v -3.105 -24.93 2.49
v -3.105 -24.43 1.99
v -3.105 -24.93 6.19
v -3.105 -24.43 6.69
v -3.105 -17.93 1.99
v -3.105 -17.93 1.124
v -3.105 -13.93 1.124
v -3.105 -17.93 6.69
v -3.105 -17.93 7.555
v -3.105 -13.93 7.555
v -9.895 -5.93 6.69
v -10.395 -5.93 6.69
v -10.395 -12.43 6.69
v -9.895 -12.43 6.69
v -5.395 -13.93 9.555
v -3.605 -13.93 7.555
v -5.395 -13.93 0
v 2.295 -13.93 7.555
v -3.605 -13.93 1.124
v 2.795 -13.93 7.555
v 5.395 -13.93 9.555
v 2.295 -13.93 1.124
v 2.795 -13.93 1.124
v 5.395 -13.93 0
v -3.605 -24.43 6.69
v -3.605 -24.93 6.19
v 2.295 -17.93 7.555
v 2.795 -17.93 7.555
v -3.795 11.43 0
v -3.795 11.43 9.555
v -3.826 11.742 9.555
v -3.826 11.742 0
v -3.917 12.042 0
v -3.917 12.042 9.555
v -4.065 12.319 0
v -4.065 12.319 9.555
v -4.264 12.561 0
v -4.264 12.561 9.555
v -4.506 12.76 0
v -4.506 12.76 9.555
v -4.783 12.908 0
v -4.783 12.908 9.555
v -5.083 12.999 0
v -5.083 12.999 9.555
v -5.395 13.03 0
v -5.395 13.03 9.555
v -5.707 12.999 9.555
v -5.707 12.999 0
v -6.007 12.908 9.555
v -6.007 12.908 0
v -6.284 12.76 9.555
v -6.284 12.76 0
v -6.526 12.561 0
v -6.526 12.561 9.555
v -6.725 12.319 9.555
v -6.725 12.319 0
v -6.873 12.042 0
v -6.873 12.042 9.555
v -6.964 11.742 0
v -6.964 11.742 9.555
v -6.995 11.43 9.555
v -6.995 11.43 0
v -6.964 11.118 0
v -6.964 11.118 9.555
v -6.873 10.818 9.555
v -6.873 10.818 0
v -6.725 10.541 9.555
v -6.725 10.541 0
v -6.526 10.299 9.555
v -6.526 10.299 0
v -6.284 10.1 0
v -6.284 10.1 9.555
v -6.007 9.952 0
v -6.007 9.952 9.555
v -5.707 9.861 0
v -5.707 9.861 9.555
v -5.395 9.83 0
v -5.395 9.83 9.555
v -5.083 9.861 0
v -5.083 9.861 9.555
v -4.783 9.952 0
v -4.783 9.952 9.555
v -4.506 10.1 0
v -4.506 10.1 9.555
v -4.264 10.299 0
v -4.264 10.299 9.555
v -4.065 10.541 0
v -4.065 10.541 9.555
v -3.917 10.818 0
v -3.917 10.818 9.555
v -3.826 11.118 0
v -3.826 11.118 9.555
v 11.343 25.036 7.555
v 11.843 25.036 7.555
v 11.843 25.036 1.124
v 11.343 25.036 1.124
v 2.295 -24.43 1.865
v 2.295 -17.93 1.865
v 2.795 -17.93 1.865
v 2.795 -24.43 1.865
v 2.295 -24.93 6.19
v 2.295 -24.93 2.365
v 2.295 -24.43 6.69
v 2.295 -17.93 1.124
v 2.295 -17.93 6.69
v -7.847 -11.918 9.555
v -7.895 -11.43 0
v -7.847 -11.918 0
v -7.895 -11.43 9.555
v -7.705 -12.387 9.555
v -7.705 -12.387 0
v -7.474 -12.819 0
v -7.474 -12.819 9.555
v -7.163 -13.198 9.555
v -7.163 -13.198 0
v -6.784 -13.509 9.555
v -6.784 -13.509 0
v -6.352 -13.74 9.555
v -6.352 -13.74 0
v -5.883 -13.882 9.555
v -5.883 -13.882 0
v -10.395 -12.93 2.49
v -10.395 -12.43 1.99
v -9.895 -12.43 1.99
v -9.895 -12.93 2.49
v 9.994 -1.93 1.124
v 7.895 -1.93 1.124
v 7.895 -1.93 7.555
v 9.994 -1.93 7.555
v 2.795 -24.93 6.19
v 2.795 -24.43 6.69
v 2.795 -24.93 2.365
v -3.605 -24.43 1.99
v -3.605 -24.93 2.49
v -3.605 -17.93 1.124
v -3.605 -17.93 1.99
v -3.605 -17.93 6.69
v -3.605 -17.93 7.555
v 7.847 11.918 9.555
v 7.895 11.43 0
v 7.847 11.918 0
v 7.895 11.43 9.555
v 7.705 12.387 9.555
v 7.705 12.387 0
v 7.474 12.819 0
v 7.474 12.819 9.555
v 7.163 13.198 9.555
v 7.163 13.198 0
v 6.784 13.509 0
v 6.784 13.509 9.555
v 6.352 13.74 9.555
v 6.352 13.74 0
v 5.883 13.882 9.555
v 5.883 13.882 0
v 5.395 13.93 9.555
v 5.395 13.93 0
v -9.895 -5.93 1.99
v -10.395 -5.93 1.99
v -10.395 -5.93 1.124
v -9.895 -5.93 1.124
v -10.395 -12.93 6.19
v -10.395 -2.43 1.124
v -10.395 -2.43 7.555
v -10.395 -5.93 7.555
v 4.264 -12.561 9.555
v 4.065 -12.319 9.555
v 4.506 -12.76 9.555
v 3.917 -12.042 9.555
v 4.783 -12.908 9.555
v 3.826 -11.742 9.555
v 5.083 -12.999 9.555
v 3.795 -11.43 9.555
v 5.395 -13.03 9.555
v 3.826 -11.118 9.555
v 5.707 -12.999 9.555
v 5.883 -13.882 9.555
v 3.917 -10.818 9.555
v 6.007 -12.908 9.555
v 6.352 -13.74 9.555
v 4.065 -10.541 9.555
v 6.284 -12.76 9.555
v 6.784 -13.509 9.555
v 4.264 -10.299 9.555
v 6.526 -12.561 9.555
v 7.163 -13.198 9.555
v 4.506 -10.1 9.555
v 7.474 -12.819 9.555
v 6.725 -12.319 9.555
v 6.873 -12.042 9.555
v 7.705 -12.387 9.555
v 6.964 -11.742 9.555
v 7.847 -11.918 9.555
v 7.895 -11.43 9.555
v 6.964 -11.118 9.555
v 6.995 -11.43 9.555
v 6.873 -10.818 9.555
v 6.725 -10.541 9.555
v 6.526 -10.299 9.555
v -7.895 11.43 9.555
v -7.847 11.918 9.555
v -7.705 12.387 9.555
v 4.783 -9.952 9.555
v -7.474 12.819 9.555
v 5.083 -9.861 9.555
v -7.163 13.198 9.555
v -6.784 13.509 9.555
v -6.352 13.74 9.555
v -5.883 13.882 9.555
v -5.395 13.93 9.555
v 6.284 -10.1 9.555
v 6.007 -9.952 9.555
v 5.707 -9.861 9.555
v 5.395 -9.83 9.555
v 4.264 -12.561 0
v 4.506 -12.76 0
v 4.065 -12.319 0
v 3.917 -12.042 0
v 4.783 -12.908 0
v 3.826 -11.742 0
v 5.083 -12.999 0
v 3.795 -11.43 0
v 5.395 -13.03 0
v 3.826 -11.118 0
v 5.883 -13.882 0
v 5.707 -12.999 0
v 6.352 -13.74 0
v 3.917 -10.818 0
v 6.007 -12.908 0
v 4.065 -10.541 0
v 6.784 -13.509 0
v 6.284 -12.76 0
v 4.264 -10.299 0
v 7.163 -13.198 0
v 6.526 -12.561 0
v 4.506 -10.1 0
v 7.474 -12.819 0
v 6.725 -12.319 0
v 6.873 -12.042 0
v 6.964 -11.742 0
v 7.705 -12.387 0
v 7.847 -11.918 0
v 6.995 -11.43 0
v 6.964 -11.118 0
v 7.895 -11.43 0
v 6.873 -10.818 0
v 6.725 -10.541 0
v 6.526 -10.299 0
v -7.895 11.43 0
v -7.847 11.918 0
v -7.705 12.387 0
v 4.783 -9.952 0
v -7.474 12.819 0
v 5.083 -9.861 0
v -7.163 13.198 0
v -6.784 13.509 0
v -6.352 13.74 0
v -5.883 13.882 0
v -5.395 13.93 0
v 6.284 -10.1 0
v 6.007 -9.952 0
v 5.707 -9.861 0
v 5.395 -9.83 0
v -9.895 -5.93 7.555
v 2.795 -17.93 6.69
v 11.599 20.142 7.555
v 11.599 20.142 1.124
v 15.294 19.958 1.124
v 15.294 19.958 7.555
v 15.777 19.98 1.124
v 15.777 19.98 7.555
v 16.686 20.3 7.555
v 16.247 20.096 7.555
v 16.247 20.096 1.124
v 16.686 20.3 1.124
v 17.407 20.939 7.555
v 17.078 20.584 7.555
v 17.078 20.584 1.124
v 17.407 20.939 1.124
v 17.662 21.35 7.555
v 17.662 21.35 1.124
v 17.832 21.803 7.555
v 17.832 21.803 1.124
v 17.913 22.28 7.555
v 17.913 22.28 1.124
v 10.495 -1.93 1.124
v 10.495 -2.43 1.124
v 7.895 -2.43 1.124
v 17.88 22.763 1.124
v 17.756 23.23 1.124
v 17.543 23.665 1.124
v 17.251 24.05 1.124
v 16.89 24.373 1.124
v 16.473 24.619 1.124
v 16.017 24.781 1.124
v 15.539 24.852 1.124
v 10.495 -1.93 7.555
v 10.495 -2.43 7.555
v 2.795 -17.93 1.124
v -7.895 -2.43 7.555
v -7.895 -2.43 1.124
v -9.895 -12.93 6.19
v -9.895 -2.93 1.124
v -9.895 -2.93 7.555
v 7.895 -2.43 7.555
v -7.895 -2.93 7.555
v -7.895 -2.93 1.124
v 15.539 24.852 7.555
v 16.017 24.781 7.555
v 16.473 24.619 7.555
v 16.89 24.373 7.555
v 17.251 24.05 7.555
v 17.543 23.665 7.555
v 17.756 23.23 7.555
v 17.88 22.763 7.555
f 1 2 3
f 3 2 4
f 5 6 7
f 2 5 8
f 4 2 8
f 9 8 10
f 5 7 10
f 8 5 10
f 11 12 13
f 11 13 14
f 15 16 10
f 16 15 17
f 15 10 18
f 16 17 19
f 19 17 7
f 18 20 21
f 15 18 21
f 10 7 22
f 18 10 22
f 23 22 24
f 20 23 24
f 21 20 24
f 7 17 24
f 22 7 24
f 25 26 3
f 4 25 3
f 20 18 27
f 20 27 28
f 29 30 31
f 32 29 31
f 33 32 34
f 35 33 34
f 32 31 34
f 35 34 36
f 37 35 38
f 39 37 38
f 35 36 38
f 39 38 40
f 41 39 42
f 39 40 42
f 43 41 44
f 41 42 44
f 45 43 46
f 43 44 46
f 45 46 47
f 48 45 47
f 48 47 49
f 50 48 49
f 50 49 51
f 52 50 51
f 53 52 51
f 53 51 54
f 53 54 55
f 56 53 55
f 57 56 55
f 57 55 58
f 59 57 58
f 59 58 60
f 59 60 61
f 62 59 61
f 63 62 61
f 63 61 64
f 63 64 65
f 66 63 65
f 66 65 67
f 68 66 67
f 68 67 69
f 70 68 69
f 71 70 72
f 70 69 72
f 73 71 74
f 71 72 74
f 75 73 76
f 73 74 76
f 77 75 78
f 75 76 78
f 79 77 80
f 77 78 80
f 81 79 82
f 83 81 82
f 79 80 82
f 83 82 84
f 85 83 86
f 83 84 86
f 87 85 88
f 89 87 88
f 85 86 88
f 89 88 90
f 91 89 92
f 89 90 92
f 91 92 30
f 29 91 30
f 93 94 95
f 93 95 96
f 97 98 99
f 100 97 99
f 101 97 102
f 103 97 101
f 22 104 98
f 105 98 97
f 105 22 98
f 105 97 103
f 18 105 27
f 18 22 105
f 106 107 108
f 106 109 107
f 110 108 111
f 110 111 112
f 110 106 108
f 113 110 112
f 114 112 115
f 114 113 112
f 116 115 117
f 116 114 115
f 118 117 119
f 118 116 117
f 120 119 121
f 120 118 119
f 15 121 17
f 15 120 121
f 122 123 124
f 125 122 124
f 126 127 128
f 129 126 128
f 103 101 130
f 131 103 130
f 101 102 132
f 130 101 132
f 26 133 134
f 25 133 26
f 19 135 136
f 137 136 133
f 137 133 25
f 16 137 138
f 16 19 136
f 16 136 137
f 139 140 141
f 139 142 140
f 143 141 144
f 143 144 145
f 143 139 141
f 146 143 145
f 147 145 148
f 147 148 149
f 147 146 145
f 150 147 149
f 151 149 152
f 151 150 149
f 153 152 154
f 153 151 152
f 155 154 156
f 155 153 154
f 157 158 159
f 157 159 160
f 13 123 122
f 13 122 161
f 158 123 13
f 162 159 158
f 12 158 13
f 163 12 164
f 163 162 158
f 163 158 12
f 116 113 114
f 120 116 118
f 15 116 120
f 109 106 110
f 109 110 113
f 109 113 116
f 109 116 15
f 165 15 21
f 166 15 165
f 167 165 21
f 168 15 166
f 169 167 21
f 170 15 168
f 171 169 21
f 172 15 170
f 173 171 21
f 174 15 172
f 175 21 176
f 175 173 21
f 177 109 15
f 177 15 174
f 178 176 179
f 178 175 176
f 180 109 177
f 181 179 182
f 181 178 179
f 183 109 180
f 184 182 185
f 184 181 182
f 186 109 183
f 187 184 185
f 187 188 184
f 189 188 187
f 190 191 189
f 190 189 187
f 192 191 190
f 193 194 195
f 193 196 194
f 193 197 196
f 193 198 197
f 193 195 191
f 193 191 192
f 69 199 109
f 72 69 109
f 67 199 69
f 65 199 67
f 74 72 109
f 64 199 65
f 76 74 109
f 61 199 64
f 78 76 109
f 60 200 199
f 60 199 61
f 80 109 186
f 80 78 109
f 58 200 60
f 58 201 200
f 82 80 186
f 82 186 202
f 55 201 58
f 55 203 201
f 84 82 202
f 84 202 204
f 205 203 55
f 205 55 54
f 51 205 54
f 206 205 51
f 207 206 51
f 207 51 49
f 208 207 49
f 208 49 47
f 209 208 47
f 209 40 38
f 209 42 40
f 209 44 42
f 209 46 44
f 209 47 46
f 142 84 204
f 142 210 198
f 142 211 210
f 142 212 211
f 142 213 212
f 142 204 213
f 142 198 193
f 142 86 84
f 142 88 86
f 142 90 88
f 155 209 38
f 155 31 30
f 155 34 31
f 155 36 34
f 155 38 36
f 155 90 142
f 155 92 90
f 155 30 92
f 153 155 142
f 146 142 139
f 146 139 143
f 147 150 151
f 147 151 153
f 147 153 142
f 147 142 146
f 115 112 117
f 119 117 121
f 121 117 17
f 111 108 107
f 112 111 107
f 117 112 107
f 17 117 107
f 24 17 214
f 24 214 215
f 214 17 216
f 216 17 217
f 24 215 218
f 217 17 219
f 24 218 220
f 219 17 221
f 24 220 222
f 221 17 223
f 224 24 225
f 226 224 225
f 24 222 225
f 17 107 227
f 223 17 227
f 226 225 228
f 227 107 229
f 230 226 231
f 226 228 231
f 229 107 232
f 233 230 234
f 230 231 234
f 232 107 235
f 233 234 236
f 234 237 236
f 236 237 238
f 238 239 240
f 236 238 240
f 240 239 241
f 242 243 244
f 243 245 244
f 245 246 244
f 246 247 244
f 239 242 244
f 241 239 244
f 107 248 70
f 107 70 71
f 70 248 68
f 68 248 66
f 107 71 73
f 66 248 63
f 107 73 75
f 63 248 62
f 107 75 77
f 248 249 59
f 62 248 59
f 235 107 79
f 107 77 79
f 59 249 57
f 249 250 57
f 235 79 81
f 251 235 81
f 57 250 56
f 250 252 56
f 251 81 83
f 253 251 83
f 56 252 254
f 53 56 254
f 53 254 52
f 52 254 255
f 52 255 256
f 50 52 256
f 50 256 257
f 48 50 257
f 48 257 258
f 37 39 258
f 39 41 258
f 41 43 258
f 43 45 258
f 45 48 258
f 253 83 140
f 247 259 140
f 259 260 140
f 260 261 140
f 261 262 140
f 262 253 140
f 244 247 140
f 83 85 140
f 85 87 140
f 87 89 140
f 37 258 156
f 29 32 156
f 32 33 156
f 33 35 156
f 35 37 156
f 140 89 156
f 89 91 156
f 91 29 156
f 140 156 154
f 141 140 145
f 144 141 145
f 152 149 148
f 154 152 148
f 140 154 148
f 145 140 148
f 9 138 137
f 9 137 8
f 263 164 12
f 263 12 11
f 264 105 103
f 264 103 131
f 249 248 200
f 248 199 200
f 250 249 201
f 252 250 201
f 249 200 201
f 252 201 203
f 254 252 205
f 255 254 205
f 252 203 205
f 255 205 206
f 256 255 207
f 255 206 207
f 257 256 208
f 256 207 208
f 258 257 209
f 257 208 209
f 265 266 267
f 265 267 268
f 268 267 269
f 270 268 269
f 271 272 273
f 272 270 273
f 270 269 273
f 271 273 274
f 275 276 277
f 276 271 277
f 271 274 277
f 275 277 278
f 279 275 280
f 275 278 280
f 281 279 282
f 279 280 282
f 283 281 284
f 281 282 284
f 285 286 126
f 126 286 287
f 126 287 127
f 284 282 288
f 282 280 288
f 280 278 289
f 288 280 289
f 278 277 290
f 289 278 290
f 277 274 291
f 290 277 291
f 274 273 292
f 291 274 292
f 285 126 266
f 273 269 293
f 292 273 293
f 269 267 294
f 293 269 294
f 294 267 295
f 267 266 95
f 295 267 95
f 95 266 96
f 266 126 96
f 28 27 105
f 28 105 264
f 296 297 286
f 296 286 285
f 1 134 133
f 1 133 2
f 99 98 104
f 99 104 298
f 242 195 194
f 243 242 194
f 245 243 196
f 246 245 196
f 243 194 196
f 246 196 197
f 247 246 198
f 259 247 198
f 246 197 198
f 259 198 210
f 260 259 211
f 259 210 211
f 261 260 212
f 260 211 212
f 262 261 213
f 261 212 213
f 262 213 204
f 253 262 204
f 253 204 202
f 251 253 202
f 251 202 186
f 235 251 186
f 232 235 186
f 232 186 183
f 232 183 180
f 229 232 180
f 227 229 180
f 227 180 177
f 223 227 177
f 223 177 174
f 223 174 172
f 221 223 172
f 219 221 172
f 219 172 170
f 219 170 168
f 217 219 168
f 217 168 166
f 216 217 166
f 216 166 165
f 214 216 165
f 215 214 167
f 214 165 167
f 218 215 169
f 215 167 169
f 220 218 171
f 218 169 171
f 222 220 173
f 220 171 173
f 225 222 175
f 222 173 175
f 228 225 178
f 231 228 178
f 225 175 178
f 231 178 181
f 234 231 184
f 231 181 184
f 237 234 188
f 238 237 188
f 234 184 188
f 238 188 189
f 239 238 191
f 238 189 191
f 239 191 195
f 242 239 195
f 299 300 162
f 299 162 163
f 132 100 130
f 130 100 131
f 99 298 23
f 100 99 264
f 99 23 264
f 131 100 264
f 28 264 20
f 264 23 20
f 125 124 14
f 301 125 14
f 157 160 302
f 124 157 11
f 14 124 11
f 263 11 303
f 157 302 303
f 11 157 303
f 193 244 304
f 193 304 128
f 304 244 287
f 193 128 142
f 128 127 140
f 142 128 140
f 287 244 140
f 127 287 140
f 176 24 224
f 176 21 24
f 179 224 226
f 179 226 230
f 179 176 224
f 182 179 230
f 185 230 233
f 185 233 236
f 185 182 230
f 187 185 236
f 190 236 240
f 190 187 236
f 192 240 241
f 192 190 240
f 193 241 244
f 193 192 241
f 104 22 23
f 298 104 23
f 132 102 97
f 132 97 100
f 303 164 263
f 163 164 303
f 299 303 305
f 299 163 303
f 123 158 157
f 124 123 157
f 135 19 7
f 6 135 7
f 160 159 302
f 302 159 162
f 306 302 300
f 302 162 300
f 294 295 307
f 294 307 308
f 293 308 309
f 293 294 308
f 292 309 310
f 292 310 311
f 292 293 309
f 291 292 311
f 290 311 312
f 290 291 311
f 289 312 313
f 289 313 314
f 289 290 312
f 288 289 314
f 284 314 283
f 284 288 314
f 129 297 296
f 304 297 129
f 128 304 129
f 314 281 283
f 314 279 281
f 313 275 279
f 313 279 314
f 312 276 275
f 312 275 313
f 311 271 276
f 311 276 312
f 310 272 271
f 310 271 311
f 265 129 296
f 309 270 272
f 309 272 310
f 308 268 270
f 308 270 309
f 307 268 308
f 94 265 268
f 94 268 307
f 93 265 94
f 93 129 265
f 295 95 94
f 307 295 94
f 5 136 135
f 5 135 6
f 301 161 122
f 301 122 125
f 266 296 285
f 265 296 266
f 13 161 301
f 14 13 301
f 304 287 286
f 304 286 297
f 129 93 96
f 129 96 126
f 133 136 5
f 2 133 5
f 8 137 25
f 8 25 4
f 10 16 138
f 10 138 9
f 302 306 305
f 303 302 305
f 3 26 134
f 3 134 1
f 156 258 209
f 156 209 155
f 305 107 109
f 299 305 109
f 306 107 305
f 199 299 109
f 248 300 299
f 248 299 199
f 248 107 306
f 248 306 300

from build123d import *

# Parameters (mm, degrees)
F0_W         = 15.79
F0_H         = 27.86
F1_DEPTH     = 9.555
F2_R         = 2.5
F3_R         = 1.6
F4_DEPTH     = 25
F5_W         = 0.5
F5_H         = 6.4308560686
F6_DEPTH     = 4
F7_W         = 0.5
F7_H         = 4.7
F7_H_2       = 4.8242840722
F8_DEPTH     = 7
F9_SIZE      = 0.5
F10_W        = 0.5
F10_H        = 6.4308560686
F11_DEPTH    = 2.5
F12_W        = 0.5
F12_H        = 6.4308560686
F13_DEPTH    = 3
F14_W        = 0.5
F14_H        = 4.7
F15_DEPTH    = 7
F16_SIZE     = 0.5
F17_W        = 0.5
F17_H        = 6.4308560686
F18_DEPTH    = 2.6
F20_DEPTH    = 6.4308560686
F21_W        = 4.9
F21_H        = 6.4308560686
F22_DEPTH    = 6.2
F23_T1_DEPTH = 18.9308560686


# Not quite as in the source:
# - a fillet or chamfer that OpenCascade refuses, or shapes differently, is made with other operations: its cross-section is extruded or revolved along the edge and cut away or added


with BuildPart() as f1:
    # F0 (on Top) → F1 (new body)
    with BuildSketch(Plane.XY):
        Rectangle(F0_W, F0_H)
    extrude(amount=F1_DEPTH)

    # F2
    f2_edges = [f1.edges().sort_by_distance(p)[0] for p in [
        (-7.895, 13.93, 4.7775),
        (7.895, 13.93, 4.7775),
        (-7.895, -13.93, 4.7775),
        (7.895, -13.93, 4.7775),
    ]]
    fillet(f2_edges, radius=F2_R)

    # F3 (on face) → F4 (cut)
    with BuildSketch(Plane.XY.offset(9.555)):
        with Locations((-5.395, 11.43)):
            Circle(F3_R)
        with Locations((5.395, -11.43)):
            Circle(F3_R)
    extrude(amount=-F4_DEPTH, mode=Mode.SUBTRACT)

    # F5 (on face) → F6 (join)
    with BuildSketch(Plane.XZ.offset(13.93)):
        with Locations((-3.355, 4.3395719657)):
            Rectangle(F5_W, F5_H)
        with Locations((2.545, 4.3395719657)):
            Rectangle(F5_W, F5_H)
    extrude(amount=F6_DEPTH)

    # F7 (on face) → F8 (join)
    with BuildSketch(Plane.XZ.offset(17.93)):
        with Locations((-3.355, 4.3395719657)):
            Rectangle(F7_W, F7_H)
        with Locations((2.545, 4.2774299296)):
            Rectangle(F7_W, F7_H_2)
    extrude(amount=F8_DEPTH)

    # F9
    f9_edges = [f1.edges().sort_by_distance(p)[0] for p in [
        (-3.355, -24.93, 6.689572),
        (2.545, -24.93, 6.689572),
        (2.545, -24.93, 1.865288),
        (-3.355, -24.93, 1.989572),
    ]]
    chamfer(f9_edges, length=F9_SIZE)

    # F10 (on face) → F11 (join)
    with BuildSketch(Plane(origin=(-7.895, 0, 0), x_dir=(0, -1, 0), z_dir=(-1, 0, 0))):
        with Locations((2.68, 4.3395719657)):
            Rectangle(F10_W, F10_H)
    extrude(amount=F11_DEPTH)

    # F12 (on face) → F13 (join)
    with BuildSketch(Plane.XZ.offset(2.93)):
        with Locations((-10.145, 4.3395719657)):
            Rectangle(F12_W, F12_H)
    extrude(amount=F13_DEPTH)

    # F14 (on face) → F15 (join)
    with BuildSketch(Plane.XZ.offset(5.93)):
        with Locations((-10.145, 4.3395719657)):
            Rectangle(F14_W, F14_H)
    extrude(amount=F15_DEPTH)

    # F16
    f16_edges = [f1.edges().sort_by_distance(p)[0] for p in [
        (-10.145, -12.93, 6.689572),
        (-10.145, -12.93, 1.989572),
    ]]
    chamfer(f16_edges, length=F16_SIZE)

    # F17 (on face) → F18 (join)
    with BuildSketch(Plane.YZ.offset(7.895)):
        with Locations((-2.18, 4.3395719657)):
            Rectangle(F17_W, F17_H)
    extrude(amount=F18_DEPTH)

    # F19 (on face) → F20 (join, through all)
    with BuildSketch(Plane.XY.offset(7.555)):
        Polygon((11.3426885902, 25.0363132727), (9.9943753924, -1.93), (10.495, -1.93), (11.8433131978, 25.0363132727), align=None)
    extrude(amount=-F20_DEPTH)

    # F21 (on face) → F22 (join)
    with BuildSketch(Plane(origin=(10.5650872021, -0.528253394, 0), x_dir=(0.0499375258, 0.9987523434, 0), z_dir=(0.9987523434, -0.0499375258, 0))):
        with Locations((23.1465023109, 4.3395719657)):
            Rectangle(F21_W, F21_H)
    extrude(amount=F22_DEPTH)

    # F23: fillet of radius 2.5 on 2 edges, made by hand

    # F23_s2 → F23_t1 (cut)
    with BuildSketch(Plane.XY.offset(-5.1258560686)):
        with BuildLine():
            ThreePointArc((15.2940029919, 19.9576579442), (17.0961302855, 20.600699508), (17.9157276651, 22.3296949882))
            Line((17.9157276651, 22.3296949882), (17.7908838505, 19.8328141296))
            Line((17.7908838505, 19.8328141296), (15.2940029919, 19.9576579442))
        make_face()
        with BuildLine():
            ThreePointArc((15.5386968685, 24.8515444271), (17.2676923487, 24.0319470475), (17.9107339125, 22.2298197539))
            Line((17.9107339125, 22.2298197539), (18.0355777271, 24.7267006124))
            Line((18.0355777271, 24.7267006124), (15.5386968685, 24.8515444271))
        make_face()
    extrude(amount=F23_T1_DEPTH, mode=Mode.SUBTRACT)


solid = f1.part
